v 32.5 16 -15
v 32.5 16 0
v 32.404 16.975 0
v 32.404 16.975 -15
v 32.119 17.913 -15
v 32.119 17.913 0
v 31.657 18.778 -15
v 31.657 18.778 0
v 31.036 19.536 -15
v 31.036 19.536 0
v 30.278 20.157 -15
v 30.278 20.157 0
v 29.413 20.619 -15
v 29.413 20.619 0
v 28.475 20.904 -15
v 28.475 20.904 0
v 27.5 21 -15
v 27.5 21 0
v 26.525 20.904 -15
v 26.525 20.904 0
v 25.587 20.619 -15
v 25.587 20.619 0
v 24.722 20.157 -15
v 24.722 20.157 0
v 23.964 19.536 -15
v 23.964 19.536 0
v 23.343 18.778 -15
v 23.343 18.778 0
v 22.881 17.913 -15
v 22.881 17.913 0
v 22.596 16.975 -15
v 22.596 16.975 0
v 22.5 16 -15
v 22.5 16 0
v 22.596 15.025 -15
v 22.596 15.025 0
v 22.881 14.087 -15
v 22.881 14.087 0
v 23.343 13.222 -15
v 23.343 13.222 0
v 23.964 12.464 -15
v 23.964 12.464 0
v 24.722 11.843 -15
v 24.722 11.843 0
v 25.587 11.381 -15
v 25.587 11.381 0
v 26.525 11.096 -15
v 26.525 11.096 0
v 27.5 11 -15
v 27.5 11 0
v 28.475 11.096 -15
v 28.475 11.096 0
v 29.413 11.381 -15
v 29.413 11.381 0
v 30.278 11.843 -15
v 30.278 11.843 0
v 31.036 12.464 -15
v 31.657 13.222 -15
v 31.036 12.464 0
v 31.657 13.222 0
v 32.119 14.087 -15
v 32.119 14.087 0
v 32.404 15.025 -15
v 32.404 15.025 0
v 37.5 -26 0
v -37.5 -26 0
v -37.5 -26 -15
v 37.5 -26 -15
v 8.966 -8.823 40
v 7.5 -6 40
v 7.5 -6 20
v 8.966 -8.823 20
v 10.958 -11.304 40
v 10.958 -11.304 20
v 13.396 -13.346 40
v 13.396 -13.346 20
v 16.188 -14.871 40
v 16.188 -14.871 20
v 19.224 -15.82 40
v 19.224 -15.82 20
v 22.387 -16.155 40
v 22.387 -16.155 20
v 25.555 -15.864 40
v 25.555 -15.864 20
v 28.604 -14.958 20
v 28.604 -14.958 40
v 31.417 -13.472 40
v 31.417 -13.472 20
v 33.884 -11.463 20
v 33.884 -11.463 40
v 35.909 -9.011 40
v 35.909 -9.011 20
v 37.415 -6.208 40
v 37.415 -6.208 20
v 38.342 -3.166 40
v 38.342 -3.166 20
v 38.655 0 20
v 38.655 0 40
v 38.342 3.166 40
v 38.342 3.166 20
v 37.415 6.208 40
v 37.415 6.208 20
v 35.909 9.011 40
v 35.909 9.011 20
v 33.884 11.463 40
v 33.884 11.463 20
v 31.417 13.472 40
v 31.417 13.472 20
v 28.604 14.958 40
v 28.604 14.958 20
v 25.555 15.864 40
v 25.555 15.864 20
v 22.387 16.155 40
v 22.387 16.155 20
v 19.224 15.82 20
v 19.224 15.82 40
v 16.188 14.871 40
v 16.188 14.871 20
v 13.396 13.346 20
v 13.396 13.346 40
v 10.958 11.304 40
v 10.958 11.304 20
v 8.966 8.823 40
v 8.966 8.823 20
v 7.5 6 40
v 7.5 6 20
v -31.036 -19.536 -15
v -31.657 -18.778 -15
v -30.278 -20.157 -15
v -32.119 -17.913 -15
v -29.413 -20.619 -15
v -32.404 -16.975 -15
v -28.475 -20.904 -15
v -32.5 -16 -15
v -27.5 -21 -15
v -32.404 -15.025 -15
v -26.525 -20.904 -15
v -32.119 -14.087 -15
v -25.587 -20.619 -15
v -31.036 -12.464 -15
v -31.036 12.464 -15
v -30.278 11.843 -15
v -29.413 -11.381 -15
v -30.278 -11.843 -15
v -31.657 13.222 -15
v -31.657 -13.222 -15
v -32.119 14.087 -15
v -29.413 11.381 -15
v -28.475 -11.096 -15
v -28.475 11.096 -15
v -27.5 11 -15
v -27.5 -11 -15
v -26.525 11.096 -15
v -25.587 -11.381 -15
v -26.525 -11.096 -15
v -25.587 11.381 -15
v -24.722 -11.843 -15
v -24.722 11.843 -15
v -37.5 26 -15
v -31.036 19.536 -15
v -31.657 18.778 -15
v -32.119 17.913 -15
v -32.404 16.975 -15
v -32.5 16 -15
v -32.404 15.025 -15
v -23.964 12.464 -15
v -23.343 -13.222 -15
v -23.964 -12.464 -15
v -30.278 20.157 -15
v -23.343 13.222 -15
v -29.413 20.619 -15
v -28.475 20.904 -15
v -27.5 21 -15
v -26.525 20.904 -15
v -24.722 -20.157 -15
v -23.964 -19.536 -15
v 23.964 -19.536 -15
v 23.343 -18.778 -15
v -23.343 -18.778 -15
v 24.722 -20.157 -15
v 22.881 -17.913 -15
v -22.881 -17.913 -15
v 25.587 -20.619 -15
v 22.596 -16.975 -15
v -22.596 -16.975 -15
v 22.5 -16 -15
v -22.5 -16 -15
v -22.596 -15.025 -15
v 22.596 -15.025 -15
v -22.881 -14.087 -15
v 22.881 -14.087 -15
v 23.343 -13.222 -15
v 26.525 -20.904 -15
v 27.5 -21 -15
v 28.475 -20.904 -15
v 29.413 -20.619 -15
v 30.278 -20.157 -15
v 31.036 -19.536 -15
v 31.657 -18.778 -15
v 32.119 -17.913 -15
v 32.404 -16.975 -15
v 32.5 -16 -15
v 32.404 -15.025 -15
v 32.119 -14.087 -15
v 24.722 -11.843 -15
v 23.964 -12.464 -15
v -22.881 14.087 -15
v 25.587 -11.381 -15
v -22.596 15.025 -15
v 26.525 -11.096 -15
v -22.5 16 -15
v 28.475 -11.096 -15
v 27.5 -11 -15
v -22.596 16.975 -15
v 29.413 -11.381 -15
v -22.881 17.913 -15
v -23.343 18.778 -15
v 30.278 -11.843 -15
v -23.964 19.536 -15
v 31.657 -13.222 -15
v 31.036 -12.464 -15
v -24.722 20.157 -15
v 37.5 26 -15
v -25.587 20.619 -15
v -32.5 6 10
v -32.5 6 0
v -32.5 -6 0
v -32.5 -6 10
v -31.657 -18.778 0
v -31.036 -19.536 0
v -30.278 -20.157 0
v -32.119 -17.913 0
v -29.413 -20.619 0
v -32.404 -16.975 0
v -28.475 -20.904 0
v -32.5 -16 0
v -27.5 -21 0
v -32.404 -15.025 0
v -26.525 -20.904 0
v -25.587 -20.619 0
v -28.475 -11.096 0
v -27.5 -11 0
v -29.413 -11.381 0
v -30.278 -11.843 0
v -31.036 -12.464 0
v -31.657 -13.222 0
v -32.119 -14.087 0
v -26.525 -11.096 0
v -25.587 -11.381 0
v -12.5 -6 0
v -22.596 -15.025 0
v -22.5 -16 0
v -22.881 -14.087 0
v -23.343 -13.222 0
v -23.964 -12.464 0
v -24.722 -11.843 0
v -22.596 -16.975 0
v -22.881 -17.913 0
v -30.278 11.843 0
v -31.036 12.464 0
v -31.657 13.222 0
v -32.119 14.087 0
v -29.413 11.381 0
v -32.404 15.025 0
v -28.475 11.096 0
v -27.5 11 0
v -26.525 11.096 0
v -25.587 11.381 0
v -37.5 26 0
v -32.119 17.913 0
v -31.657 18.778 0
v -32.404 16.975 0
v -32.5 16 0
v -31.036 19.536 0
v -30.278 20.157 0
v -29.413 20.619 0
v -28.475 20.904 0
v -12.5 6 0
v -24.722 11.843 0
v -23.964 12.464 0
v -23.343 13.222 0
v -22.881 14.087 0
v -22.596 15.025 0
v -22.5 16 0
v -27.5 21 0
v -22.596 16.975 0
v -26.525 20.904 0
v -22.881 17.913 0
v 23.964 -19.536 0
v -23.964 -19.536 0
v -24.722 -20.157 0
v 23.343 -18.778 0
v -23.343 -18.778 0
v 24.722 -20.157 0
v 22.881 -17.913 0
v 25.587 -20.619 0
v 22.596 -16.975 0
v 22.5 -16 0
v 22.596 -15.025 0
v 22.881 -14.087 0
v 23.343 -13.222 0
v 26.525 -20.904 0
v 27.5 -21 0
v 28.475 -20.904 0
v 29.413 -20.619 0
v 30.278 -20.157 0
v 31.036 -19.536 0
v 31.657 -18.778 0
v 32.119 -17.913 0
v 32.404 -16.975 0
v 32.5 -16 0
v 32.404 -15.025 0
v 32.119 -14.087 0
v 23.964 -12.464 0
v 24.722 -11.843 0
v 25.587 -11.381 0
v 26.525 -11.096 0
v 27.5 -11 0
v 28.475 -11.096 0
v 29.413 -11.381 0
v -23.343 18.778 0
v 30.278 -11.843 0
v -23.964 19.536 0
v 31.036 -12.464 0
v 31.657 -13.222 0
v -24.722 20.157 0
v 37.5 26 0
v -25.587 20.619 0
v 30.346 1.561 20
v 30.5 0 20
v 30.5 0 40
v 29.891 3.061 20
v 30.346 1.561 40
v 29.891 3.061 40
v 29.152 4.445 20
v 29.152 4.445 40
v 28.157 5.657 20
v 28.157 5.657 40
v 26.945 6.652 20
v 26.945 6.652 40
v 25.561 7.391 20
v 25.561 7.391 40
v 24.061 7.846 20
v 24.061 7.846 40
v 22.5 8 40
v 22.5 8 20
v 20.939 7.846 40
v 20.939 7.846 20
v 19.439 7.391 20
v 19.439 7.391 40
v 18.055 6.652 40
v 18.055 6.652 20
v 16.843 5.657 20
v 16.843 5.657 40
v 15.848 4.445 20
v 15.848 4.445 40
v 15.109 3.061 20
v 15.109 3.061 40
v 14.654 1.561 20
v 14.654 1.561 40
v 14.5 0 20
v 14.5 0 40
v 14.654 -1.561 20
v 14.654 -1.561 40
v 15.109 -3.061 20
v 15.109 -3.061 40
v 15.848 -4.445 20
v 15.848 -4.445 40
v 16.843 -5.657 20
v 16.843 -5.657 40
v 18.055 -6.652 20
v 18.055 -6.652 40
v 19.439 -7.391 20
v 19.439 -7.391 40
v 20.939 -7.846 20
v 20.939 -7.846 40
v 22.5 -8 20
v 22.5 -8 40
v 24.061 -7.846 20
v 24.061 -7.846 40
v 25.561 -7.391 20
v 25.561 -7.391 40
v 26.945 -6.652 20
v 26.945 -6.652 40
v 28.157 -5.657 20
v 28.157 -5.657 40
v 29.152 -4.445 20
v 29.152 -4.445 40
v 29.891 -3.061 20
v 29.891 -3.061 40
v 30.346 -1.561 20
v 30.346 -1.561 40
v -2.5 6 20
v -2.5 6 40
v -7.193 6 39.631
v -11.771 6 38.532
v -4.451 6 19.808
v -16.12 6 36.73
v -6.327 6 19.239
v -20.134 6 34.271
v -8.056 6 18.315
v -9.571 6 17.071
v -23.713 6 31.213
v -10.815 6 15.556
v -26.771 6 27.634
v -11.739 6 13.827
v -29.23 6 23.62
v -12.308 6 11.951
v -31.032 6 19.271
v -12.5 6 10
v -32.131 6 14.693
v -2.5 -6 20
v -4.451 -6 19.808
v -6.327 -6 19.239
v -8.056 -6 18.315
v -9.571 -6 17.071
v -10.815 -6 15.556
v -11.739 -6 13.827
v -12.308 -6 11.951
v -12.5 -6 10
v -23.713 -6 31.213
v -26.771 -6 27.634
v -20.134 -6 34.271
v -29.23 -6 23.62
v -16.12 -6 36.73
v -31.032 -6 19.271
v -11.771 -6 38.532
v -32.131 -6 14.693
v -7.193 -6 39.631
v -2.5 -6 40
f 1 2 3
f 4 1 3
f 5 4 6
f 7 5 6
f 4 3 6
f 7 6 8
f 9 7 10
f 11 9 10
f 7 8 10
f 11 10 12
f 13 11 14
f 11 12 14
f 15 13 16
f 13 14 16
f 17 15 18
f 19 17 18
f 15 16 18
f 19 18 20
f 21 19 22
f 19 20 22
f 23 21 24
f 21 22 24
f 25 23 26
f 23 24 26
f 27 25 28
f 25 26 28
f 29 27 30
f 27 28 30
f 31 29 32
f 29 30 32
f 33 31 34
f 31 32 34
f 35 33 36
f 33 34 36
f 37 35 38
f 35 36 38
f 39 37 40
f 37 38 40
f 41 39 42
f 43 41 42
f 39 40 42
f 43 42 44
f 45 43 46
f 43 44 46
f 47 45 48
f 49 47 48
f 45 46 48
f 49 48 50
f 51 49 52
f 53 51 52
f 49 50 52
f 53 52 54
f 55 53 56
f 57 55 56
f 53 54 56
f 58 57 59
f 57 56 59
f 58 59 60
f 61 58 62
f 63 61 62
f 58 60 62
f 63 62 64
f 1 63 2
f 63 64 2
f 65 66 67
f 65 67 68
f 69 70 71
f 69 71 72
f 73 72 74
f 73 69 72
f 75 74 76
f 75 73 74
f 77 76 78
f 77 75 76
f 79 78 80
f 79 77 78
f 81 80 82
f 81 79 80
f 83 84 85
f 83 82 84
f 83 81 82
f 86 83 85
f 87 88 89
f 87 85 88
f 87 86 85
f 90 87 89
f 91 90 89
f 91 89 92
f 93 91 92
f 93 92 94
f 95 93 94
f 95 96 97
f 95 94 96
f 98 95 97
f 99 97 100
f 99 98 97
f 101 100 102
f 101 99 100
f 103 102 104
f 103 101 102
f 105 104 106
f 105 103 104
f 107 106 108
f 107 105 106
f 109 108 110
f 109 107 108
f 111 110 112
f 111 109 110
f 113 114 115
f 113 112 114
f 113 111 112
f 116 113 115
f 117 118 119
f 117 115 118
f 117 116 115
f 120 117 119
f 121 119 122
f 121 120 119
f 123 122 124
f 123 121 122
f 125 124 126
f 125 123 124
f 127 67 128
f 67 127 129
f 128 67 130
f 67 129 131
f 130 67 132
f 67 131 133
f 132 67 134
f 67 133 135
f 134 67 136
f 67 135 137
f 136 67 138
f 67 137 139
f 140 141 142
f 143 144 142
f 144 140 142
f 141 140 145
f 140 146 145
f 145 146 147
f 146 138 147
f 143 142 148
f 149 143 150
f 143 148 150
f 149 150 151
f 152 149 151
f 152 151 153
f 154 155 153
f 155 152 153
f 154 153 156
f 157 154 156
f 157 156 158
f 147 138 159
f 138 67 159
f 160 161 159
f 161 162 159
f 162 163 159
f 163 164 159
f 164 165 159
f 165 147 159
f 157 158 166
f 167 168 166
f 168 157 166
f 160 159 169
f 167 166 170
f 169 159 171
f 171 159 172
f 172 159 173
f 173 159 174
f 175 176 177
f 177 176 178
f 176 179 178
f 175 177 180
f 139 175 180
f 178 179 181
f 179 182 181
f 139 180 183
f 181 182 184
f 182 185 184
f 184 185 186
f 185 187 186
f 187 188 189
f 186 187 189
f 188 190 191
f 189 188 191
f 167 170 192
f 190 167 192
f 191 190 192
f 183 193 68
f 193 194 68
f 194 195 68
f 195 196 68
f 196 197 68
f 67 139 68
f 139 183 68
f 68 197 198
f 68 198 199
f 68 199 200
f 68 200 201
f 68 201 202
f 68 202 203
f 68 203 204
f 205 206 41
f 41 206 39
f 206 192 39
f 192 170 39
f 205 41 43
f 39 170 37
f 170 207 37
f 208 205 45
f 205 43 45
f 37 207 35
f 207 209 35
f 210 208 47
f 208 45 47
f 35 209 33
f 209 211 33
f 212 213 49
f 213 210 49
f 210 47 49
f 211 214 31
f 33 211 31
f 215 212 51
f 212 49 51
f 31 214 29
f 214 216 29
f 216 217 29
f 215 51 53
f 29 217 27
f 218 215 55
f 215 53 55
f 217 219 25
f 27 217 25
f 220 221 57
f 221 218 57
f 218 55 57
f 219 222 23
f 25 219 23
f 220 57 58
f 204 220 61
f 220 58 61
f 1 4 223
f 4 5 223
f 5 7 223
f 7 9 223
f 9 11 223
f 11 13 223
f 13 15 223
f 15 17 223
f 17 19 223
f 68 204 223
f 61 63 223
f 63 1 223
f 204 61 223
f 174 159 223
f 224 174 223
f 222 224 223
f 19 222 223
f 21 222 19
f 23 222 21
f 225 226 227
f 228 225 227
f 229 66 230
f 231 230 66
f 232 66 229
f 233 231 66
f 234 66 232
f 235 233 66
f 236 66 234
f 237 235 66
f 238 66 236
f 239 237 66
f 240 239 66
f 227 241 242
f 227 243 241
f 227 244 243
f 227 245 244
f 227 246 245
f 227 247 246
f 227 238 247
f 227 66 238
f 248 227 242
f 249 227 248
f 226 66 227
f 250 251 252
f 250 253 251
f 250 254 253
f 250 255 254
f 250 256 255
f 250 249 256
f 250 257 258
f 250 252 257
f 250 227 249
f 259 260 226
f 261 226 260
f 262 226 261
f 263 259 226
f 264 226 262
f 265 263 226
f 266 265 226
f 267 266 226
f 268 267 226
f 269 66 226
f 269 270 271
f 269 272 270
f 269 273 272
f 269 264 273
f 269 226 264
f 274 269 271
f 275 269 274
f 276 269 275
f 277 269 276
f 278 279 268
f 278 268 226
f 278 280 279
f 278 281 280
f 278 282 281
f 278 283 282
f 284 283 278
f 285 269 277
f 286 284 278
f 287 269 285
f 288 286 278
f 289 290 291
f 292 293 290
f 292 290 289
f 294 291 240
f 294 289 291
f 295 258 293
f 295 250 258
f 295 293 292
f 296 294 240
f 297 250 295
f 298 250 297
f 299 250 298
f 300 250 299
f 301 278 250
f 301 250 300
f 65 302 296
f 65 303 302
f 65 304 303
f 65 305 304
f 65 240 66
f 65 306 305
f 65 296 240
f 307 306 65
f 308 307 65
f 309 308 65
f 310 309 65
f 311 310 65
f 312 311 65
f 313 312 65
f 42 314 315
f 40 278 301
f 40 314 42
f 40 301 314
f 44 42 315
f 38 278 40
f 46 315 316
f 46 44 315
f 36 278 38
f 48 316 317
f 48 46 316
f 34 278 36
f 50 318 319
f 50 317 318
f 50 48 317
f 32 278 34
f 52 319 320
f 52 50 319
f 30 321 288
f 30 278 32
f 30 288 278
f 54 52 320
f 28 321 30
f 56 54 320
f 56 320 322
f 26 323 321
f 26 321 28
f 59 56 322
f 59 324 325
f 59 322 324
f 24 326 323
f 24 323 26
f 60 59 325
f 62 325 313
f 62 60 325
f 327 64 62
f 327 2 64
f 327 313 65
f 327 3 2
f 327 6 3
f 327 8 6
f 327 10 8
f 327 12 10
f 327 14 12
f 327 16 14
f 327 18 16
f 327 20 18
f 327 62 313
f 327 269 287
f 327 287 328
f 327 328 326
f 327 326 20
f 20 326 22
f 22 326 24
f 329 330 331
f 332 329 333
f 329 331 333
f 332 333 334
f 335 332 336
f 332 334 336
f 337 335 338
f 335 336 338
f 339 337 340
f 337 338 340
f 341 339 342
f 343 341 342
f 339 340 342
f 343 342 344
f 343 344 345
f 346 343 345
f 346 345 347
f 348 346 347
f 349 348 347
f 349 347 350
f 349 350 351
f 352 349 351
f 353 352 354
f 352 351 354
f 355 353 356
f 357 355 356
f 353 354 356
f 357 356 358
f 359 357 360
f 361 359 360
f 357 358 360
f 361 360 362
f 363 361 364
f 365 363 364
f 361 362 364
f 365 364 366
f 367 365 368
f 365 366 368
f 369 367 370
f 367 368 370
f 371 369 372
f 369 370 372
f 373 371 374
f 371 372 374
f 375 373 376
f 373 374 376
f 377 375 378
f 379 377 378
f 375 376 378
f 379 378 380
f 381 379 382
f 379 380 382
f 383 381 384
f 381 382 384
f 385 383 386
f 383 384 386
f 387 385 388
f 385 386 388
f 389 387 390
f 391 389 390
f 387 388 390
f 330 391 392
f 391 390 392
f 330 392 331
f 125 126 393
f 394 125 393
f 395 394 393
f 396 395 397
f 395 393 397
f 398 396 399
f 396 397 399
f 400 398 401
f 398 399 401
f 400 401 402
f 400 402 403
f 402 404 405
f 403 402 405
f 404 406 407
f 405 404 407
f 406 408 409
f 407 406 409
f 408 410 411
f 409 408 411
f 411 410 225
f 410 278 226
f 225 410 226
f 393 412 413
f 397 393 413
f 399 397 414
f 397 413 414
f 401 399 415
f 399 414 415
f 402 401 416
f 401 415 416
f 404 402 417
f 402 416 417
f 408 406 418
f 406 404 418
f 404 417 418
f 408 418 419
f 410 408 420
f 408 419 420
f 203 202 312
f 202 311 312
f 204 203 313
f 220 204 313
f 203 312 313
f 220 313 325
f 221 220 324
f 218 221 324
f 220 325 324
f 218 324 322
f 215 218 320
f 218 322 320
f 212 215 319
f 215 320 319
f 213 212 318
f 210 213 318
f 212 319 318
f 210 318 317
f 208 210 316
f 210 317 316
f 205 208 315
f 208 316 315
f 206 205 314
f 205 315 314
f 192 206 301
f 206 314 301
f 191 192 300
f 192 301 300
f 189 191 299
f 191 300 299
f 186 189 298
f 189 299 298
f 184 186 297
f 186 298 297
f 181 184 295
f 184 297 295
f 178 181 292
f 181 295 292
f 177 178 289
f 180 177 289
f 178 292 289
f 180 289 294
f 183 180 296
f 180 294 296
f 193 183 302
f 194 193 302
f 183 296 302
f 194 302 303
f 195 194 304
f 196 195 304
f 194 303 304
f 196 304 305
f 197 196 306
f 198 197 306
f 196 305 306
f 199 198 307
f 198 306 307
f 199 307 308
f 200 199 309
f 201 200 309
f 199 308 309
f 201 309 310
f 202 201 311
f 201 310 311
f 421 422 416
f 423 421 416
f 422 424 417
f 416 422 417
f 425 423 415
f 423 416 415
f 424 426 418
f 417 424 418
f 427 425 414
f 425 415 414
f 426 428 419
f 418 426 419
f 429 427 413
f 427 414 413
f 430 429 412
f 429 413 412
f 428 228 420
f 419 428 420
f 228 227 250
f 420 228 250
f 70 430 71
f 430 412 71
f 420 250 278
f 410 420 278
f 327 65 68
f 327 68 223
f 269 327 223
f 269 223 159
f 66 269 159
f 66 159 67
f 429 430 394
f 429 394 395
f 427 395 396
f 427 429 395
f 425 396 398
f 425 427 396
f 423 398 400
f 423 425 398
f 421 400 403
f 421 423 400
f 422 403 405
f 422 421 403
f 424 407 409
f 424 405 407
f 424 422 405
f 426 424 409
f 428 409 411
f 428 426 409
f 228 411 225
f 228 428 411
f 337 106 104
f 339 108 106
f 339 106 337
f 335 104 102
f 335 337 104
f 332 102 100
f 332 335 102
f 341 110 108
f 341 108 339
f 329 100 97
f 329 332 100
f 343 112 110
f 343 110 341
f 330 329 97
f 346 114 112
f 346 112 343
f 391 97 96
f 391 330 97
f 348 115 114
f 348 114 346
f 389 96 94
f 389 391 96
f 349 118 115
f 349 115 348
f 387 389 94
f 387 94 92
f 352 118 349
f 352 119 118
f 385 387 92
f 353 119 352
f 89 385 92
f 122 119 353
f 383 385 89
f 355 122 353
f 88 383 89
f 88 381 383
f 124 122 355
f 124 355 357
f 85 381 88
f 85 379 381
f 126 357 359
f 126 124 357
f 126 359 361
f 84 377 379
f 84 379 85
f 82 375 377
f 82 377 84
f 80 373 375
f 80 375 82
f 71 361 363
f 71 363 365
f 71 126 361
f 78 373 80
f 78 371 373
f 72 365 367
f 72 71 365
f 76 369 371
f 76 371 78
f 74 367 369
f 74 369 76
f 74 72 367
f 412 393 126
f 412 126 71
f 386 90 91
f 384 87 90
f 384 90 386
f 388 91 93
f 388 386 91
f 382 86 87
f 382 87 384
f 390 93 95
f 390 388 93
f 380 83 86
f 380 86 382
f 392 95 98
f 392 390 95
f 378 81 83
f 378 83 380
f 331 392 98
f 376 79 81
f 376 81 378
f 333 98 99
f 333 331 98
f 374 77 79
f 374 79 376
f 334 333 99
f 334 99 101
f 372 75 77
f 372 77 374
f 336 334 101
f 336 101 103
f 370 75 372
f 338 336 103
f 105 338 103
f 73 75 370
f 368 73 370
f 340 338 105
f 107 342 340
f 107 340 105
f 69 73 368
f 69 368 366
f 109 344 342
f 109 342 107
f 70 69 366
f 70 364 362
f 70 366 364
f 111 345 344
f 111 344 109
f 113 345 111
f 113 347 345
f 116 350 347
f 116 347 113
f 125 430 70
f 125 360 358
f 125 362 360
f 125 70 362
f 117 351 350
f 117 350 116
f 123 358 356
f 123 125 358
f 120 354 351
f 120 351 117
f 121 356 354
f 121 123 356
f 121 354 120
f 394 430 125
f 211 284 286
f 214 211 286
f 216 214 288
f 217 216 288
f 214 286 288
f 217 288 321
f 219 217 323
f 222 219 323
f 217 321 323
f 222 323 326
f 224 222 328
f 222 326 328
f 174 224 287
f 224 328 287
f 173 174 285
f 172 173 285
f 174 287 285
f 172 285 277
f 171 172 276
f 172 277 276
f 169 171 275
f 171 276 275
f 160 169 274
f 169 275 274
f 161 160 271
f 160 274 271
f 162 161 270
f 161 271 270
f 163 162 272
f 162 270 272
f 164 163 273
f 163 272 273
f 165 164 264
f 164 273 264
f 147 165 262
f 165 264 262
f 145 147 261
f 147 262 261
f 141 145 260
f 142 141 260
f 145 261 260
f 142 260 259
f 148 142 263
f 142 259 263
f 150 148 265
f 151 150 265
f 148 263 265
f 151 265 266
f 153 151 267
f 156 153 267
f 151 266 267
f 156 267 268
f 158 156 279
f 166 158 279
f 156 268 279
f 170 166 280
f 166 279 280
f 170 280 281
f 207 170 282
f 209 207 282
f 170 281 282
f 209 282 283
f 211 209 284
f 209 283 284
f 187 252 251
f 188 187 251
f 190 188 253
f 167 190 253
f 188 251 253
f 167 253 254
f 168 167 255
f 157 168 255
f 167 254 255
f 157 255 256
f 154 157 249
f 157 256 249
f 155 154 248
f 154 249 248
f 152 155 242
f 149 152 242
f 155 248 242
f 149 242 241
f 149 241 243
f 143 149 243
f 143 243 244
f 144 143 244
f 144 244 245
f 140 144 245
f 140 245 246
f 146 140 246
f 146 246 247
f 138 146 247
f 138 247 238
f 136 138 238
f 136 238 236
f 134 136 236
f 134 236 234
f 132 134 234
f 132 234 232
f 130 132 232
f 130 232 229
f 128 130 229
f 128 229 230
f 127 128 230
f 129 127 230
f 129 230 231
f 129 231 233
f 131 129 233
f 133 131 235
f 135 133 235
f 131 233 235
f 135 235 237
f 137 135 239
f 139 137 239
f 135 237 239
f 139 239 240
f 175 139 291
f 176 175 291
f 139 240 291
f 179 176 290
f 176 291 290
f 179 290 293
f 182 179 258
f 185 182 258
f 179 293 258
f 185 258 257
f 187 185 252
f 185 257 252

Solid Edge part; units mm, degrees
sketch "Sketch1" plane through (0, 0, 0) normal (0, 0, 1) x (1, 0, 0)
  circle A0 centre (-27.5, 16) radius 5
  line L0 (37.5, 26) -> (-37.5, 26)
  line L1 (-37.5, 26) -> (-37.5, -26)
  line L2 (-37.5, -26) -> (37.5, -26)
  line L3 (37.5, -26) -> (37.5, 26)
  circle A1 centre (27.5, -16) radius 5
  circle A2 centre (27.5, 16) radius 5
  circle A3 centre (-27.5, -16) radius 5
extrude "Protrusion1" add sketch "Sketch1" against normal blind 15
sketch "Sketch2" plane through (0, 0, 0) normal (0, 0, 1) x (1, 0, 0)
  line L0 (-12.5, 6) -> (-32.5, 6)
  line L1 (-32.5, 6) -> (-32.5, -6)
  line L2 (-32.5, -6) -> (-12.5, -6)
  line L3 (-12.5, -6) -> (-12.5, 6)
extrude "ExtrudedProtrusion_2" add sketch "Sketch2" along normal blind 10
sketch "Sketch3" plane through (-22.5, -6, 5) normal (0, -1, 0) x (1, 0, 0)
  line L0 (20, 15) -> (20, 35)
  line L1 (10, 5) -> (-10, 5)
  arc A0 (-10, 5) -> (20, 35) centre (20, 5) cw
  arc A1 (10, 5) -> (20, 15) centre (20, 5) cw
extrude "ExtrudedProtrusion_3" add sketch "Sketch3" against normal blind 12
sketch "Sketch4" plane through (-2.5, 0, 30) normal (1, 0, 0) x (0, 1, 0)
  line L0 (6, 10) -> (6, -10)
  line L1 (6, -10) -> (-6, -10)
  line L2 (-6, -10) -> (-6, 10)
  line L3 (-6, 10) -> (6, 10)
extrude "ExtrudedProtrusion_4" add sketch "Sketch4" along normal blind 10
sketch "Sketch5" plane through (2.5, 0, 40) normal (0, 0, 1) x (1, 0, 0)
  line L0 (5, 6) -> (5, -6)
  arc A0 (5, 6) -> (5, -6) centre (20, 0) cw
  circle A1 centre (20, 0) radius 8
extrude "Protrusion2" add sketch "Sketch5" against normal up to vertex (20 mm away)
